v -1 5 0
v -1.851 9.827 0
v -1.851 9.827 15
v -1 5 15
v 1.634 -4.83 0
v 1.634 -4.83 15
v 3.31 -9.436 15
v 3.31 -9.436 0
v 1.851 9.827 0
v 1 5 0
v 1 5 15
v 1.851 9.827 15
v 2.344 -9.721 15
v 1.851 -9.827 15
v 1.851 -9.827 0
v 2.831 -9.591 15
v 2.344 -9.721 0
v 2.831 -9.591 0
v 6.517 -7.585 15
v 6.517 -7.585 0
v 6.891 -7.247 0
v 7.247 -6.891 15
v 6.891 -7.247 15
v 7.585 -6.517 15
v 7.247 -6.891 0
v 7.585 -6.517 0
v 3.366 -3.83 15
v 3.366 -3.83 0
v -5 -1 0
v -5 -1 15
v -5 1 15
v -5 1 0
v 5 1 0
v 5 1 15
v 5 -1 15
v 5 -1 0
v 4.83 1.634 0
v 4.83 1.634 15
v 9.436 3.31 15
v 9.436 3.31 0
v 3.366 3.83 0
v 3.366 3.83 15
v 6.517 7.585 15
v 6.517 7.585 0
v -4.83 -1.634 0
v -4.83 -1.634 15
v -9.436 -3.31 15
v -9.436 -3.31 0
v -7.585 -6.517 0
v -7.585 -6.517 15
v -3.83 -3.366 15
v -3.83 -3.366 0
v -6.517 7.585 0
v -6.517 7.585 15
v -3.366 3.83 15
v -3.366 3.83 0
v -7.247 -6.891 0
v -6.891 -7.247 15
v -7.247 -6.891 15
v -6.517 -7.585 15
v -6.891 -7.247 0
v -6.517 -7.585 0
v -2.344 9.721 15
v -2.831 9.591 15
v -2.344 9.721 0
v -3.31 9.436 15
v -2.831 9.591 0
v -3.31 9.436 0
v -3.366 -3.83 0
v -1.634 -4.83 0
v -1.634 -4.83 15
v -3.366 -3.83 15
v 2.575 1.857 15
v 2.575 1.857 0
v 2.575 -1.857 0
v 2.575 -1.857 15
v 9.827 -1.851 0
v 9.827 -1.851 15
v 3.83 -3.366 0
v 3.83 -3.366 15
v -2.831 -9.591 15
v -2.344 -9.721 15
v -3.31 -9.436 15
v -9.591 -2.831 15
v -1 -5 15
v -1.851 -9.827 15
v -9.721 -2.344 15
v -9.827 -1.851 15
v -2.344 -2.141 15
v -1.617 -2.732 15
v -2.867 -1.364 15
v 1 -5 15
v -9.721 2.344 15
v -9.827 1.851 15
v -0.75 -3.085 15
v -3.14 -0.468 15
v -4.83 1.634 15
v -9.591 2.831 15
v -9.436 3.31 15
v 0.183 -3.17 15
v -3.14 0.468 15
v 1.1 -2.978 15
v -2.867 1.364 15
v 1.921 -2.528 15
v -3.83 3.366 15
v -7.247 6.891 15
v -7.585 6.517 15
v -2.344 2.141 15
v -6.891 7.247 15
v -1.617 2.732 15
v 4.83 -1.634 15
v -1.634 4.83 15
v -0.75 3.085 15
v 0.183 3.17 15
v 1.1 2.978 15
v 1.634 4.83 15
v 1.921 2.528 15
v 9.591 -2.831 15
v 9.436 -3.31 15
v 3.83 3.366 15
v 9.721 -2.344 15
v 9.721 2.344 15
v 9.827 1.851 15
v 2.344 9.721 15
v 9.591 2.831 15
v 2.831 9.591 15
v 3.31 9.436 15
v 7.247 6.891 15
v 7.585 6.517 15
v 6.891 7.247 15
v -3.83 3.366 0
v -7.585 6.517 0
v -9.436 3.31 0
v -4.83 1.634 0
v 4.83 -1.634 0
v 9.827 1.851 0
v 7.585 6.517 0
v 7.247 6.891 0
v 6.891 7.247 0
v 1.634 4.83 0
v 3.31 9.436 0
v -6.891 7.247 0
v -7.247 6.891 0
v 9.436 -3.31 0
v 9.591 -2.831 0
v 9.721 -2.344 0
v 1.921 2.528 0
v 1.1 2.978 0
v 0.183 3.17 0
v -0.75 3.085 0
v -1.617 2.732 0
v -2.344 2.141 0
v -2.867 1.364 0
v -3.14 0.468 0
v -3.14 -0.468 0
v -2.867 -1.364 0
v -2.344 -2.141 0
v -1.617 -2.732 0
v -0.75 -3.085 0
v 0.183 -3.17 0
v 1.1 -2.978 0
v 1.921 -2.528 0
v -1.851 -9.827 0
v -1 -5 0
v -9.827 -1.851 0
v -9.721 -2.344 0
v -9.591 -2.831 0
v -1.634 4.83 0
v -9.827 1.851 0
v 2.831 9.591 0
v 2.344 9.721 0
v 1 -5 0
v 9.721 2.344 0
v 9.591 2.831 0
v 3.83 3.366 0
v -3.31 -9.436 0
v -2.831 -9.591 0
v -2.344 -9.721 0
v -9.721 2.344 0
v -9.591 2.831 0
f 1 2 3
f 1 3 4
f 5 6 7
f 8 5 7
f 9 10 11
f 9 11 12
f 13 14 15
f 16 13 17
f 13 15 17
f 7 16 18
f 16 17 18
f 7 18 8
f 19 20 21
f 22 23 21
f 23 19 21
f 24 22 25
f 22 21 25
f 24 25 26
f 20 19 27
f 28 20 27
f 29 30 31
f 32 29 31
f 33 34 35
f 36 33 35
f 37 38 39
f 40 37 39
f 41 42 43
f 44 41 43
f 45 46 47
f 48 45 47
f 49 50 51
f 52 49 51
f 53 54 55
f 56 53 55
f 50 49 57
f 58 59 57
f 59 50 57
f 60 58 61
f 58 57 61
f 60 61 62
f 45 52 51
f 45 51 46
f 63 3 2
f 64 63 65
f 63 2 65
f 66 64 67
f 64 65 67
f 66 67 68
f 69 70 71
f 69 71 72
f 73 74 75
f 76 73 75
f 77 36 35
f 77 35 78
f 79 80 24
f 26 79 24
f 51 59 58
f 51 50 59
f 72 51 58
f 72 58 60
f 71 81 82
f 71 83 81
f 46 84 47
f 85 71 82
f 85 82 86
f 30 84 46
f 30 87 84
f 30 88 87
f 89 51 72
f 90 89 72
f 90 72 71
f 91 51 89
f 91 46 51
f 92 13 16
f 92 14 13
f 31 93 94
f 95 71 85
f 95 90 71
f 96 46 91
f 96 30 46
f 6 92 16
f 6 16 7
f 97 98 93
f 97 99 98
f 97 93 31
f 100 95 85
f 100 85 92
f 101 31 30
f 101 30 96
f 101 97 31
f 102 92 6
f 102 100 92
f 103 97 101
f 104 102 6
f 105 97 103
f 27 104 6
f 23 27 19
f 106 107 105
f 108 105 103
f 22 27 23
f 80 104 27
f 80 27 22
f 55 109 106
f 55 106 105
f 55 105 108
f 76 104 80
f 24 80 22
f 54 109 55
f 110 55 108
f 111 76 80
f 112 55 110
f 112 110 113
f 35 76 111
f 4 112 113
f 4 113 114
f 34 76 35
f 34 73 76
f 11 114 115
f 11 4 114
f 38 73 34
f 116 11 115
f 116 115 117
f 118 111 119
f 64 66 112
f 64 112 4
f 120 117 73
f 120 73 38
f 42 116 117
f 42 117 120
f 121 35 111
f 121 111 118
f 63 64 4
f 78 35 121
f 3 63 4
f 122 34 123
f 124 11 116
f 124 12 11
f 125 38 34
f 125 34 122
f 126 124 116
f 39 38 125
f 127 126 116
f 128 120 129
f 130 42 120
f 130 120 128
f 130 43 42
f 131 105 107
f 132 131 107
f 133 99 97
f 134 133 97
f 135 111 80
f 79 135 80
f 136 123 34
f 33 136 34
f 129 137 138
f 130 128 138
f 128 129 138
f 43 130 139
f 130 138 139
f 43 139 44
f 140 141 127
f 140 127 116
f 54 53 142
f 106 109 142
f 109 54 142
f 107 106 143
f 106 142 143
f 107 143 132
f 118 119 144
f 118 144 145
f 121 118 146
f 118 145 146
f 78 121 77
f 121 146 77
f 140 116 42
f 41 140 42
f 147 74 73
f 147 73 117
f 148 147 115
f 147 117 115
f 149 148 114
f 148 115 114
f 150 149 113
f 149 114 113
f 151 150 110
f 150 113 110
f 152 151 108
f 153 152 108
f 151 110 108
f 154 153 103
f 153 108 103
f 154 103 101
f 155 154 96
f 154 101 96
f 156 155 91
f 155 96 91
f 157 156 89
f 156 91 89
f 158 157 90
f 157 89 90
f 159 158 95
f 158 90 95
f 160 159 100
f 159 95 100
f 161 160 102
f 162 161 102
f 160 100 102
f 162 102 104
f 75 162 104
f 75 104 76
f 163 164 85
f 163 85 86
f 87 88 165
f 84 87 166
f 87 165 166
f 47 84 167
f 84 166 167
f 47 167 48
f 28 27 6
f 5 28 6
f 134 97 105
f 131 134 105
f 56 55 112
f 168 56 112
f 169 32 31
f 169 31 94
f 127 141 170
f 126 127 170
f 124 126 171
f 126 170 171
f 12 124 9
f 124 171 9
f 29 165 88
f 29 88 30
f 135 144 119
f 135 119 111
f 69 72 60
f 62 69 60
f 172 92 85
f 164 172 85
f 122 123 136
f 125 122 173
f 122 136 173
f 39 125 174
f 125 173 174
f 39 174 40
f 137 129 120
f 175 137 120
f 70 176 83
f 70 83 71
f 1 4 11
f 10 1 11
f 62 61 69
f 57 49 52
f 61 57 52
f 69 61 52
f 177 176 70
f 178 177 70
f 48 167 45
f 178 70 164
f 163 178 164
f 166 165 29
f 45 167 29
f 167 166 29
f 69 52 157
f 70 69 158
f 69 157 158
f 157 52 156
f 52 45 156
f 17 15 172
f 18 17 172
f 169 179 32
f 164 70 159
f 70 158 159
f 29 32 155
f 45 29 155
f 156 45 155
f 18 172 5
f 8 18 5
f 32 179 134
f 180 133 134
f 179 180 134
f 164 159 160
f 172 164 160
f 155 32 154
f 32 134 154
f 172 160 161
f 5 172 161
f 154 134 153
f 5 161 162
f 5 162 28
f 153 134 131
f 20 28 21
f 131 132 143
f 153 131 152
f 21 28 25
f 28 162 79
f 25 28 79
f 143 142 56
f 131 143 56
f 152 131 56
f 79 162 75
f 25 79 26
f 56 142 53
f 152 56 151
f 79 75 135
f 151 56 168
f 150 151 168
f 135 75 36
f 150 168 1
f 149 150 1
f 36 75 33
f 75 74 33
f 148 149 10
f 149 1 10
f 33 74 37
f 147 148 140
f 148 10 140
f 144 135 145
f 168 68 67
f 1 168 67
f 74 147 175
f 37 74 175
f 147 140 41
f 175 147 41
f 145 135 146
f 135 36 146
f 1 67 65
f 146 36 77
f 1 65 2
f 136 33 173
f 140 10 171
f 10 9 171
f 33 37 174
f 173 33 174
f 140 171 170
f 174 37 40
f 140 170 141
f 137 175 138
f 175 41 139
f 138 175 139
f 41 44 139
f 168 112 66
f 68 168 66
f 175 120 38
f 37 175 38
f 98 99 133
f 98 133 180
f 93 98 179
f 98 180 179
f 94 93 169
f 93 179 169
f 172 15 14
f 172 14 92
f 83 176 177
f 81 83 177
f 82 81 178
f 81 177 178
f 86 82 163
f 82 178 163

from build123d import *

# Parameters (mm, degrees)
SKETCH_R           = 10
PAD_DEPTH          = 15
POCKET_DEPTH       = 15.001
POCKET001_DEPTH    = 79.032242
POLARPATTERN_COUNT = 12


with BuildPart() as part:
    # Sketch → Pad (new body)
    with BuildSketch(Plane.XY):
        Circle(SKETCH_R)
    extrude(amount=PAD_DEPTH)

    # Sketch001 (on Face3 of Pad) → Pocket (cut, through all)
    with BuildSketch(Plane.XY.offset(15)):
        with BuildLine():
            ThreePointArc((2.575, 1.857418), (-3.175, 0), (2.575, -1.857418))
            Line((2.575, 1.857418), (2.575, -1.857418))
        make_face()
    extrude(amount=-POCKET_DEPTH, mode=Mode.SUBTRACT)

    # Sketch002 (on Face3 of Pocket) → Pocket001 (cut, through all)
    with BuildSketch(Plane.XY.offset(15)):
        Polygon((-1, 5), (1, 5), (2.041891, 10.908846), (-2.041888, 10.908847), align=None)
    pocket001 = extrude(amount=-POCKET001_DEPTH, mode=Mode.SUBTRACT)

    # PolarPattern: Pocket001 ×12 about axis
    polarpattern_axis = Axis((0, 0, 15), (0, 0, 1))
    for i in range(1, POLARPATTERN_COUNT):
        add(pocket001.rotate(polarpattern_axis, i * 360 / POLARPATTERN_COUNT), mode=Mode.SUBTRACT)


solid = part.part
